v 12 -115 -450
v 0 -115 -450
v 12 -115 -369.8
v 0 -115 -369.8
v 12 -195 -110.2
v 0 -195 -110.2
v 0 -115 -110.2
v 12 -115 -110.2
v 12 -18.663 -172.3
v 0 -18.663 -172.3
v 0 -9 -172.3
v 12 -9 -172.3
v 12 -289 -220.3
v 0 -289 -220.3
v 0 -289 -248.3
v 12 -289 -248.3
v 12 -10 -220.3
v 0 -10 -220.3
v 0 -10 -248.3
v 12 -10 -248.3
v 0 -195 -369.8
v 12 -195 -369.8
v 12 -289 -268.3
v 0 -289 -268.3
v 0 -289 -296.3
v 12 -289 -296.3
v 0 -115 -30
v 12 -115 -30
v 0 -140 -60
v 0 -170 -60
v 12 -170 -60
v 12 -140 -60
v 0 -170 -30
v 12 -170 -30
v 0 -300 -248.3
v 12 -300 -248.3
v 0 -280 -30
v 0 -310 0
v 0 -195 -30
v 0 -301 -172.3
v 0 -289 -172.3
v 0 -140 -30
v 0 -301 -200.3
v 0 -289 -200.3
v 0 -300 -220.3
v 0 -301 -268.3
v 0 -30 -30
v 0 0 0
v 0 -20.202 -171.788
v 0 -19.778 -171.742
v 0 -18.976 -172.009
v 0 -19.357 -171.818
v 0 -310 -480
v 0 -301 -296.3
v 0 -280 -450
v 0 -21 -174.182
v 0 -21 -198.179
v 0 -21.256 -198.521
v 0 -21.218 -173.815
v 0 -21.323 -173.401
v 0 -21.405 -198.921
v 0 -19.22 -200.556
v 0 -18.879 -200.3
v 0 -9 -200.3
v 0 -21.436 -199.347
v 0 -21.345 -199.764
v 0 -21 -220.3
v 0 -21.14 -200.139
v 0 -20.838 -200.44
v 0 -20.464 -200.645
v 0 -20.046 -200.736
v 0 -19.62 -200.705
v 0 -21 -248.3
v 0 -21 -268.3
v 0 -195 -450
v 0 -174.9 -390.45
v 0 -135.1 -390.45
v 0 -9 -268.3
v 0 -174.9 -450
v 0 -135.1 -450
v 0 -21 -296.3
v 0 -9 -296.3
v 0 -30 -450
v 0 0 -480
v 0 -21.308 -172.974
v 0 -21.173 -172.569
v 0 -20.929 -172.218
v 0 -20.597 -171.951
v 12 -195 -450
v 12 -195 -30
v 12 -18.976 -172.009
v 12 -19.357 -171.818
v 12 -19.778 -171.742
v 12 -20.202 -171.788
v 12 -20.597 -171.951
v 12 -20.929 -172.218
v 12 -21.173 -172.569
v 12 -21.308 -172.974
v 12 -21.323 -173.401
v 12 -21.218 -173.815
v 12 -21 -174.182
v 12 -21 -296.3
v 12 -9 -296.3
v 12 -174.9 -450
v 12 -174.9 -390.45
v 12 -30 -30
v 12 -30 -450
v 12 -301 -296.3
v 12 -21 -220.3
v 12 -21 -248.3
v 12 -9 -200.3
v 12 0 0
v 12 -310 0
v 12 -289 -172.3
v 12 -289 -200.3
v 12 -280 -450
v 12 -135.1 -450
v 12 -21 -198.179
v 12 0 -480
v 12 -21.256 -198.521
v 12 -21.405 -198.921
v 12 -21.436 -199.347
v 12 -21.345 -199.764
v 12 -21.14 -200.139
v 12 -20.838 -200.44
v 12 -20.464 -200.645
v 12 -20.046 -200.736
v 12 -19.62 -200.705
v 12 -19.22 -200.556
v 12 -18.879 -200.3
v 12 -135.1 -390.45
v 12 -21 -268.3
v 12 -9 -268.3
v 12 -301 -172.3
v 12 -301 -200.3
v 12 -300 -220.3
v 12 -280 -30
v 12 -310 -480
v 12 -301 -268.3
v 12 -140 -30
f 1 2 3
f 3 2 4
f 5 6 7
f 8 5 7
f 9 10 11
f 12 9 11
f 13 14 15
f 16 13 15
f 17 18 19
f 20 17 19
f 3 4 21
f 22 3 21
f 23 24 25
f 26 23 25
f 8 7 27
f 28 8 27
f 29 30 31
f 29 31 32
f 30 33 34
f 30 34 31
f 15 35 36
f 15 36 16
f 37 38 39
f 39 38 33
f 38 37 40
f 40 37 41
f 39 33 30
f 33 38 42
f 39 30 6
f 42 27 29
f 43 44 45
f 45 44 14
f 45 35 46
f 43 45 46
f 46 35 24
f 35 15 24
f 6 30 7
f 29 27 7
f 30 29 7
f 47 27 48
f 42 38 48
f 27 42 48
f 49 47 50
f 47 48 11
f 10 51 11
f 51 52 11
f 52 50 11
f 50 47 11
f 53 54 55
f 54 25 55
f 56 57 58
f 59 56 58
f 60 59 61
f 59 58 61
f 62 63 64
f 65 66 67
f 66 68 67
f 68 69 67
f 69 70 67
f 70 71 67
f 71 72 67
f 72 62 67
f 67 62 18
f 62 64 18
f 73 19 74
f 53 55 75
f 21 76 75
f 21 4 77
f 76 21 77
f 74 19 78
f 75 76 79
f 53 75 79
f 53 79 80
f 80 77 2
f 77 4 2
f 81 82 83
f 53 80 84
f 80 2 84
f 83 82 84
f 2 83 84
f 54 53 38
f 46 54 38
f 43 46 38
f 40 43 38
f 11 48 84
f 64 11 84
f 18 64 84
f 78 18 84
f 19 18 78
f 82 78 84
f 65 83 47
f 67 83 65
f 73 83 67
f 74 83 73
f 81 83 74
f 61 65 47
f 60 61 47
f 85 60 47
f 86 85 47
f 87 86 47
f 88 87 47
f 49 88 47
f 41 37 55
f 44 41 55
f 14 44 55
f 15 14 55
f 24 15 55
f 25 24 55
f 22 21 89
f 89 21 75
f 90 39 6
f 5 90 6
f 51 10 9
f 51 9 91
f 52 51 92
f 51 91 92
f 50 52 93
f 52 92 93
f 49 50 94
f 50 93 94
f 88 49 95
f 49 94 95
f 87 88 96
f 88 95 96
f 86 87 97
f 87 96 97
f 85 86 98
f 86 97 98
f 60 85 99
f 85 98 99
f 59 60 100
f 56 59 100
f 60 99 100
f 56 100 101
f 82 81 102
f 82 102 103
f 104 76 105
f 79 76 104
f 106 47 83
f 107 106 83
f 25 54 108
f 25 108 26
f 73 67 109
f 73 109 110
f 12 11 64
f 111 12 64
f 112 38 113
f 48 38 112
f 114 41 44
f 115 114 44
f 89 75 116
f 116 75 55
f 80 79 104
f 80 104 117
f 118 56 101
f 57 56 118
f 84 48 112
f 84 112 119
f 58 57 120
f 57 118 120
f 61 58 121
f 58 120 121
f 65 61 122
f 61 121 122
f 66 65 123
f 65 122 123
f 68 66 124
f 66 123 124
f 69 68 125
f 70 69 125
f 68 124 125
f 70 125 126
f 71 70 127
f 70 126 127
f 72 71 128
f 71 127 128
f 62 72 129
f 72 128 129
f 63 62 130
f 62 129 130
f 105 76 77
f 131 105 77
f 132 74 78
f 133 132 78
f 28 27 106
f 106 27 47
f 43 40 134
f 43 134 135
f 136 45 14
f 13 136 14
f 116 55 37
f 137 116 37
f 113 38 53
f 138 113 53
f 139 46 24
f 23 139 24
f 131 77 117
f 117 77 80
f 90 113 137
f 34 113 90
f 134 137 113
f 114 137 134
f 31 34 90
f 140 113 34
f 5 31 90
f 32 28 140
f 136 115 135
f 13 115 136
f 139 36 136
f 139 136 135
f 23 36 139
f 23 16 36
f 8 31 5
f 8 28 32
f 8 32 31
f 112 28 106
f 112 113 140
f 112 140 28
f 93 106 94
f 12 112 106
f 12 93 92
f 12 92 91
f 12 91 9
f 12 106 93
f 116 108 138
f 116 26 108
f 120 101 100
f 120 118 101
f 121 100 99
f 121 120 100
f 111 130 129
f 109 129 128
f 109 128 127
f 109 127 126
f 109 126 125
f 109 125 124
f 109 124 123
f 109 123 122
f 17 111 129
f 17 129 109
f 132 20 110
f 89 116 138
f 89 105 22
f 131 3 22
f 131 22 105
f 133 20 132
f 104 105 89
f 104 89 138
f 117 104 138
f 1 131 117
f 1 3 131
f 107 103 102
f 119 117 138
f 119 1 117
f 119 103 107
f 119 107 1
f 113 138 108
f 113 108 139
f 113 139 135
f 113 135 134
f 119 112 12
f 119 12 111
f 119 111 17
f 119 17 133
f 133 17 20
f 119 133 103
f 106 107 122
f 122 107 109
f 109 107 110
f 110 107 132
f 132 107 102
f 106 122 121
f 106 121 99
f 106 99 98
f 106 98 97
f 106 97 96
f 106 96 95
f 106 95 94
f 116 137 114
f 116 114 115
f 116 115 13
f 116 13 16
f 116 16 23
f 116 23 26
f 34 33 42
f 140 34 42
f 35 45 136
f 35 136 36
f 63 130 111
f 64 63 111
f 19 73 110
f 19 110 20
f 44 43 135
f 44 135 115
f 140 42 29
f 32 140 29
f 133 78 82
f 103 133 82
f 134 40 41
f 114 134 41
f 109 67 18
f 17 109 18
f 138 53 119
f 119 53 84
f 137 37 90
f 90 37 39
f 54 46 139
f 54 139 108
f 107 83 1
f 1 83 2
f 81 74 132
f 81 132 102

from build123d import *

# Parameters (mm, degrees)
CROQUIS1_W              = 480
CROQUIS1_H              = 310
CROQUIS1_W_2            = 28
CROQUIS1_H_2            = 12
CROQUIS1_H_3            = 11
CROQUIS1_W_3            = 30
CROQUIS1_H_4            = 30
CROQUIS1_W_4            = 59.55
CROQUIS1_H_5            = 39.8
SALIENTE_EXTRUIR1_DEPTH = 12
CROQUIS6_R              = 1.5
CORTAR_EXTRUIR2_DEPTH   = 12


with BuildPart() as part:
    # Croquis1 → Saliente-Extruir1 (new body)
    with BuildSketch(Plane(origin=(0, 0, 0), x_dir=(0, 0, -1), z_dir=(1, 0, 0))):
        with Locations((240, -155)):
            Rectangle(CROQUIS1_W, CROQUIS1_H)
        Polygon((30, -30), (450, -30), (450, -115), (369.8, -115), (369.8, -195), (450, -195), (450, -280), (30, -280), (30, -195), (110.2, -195), (110.2, -115), (30, -115), align=None, mode=Mode.SUBTRACT)
        with Locations((282.300325034, -295)):
            Rectangle(CROQUIS1_W_2, CROQUIS1_H_2, mode=Mode.SUBTRACT)
        with Locations((234.300325034, -294.5)):
            Rectangle(CROQUIS1_W_2, CROQUIS1_H_3, mode=Mode.SUBTRACT)
        with Locations((186.300325034, -295)):
            Rectangle(CROQUIS1_W_2, CROQUIS1_H_2, mode=Mode.SUBTRACT)
        with Locations((186.300325034, -15)):
            Rectangle(CROQUIS1_W_2, CROQUIS1_H_2, mode=Mode.SUBTRACT)
        with Locations((282.300325034, -15)):
            Rectangle(CROQUIS1_W_2, CROQUIS1_H_2, mode=Mode.SUBTRACT)
        with Locations((234.300325034, -15.5)):
            Rectangle(CROQUIS1_W_2, CROQUIS1_H_3, mode=Mode.SUBTRACT)
        with Locations((45, -155)):
            Rectangle(CROQUIS1_W_3, CROQUIS1_H_4, mode=Mode.SUBTRACT)
        with Locations((420.225, -155)):
            Rectangle(CROQUIS1_W_4, CROQUIS1_H_5, mode=Mode.SUBTRACT)
    extrude(amount=SALIENTE_EXTRUIR1_DEPTH)

    # Croquis6 → Cortar-Extruir2 (cut)
    with BuildSketch(Plane(origin=(12, 0, 0), x_dir=(0, 0, -1), z_dir=(1, 0, 0))):
        with Locations((173.24106245, -19.831662243)):
            Circle(CROQUIS6_R)
        with Locations((199.239664862, -19.939339828)):
            Circle(CROQUIS6_R)
    extrude(amount=-CORTAR_EXTRUIR2_DEPTH, mode=Mode.SUBTRACT)


solid = part.part
